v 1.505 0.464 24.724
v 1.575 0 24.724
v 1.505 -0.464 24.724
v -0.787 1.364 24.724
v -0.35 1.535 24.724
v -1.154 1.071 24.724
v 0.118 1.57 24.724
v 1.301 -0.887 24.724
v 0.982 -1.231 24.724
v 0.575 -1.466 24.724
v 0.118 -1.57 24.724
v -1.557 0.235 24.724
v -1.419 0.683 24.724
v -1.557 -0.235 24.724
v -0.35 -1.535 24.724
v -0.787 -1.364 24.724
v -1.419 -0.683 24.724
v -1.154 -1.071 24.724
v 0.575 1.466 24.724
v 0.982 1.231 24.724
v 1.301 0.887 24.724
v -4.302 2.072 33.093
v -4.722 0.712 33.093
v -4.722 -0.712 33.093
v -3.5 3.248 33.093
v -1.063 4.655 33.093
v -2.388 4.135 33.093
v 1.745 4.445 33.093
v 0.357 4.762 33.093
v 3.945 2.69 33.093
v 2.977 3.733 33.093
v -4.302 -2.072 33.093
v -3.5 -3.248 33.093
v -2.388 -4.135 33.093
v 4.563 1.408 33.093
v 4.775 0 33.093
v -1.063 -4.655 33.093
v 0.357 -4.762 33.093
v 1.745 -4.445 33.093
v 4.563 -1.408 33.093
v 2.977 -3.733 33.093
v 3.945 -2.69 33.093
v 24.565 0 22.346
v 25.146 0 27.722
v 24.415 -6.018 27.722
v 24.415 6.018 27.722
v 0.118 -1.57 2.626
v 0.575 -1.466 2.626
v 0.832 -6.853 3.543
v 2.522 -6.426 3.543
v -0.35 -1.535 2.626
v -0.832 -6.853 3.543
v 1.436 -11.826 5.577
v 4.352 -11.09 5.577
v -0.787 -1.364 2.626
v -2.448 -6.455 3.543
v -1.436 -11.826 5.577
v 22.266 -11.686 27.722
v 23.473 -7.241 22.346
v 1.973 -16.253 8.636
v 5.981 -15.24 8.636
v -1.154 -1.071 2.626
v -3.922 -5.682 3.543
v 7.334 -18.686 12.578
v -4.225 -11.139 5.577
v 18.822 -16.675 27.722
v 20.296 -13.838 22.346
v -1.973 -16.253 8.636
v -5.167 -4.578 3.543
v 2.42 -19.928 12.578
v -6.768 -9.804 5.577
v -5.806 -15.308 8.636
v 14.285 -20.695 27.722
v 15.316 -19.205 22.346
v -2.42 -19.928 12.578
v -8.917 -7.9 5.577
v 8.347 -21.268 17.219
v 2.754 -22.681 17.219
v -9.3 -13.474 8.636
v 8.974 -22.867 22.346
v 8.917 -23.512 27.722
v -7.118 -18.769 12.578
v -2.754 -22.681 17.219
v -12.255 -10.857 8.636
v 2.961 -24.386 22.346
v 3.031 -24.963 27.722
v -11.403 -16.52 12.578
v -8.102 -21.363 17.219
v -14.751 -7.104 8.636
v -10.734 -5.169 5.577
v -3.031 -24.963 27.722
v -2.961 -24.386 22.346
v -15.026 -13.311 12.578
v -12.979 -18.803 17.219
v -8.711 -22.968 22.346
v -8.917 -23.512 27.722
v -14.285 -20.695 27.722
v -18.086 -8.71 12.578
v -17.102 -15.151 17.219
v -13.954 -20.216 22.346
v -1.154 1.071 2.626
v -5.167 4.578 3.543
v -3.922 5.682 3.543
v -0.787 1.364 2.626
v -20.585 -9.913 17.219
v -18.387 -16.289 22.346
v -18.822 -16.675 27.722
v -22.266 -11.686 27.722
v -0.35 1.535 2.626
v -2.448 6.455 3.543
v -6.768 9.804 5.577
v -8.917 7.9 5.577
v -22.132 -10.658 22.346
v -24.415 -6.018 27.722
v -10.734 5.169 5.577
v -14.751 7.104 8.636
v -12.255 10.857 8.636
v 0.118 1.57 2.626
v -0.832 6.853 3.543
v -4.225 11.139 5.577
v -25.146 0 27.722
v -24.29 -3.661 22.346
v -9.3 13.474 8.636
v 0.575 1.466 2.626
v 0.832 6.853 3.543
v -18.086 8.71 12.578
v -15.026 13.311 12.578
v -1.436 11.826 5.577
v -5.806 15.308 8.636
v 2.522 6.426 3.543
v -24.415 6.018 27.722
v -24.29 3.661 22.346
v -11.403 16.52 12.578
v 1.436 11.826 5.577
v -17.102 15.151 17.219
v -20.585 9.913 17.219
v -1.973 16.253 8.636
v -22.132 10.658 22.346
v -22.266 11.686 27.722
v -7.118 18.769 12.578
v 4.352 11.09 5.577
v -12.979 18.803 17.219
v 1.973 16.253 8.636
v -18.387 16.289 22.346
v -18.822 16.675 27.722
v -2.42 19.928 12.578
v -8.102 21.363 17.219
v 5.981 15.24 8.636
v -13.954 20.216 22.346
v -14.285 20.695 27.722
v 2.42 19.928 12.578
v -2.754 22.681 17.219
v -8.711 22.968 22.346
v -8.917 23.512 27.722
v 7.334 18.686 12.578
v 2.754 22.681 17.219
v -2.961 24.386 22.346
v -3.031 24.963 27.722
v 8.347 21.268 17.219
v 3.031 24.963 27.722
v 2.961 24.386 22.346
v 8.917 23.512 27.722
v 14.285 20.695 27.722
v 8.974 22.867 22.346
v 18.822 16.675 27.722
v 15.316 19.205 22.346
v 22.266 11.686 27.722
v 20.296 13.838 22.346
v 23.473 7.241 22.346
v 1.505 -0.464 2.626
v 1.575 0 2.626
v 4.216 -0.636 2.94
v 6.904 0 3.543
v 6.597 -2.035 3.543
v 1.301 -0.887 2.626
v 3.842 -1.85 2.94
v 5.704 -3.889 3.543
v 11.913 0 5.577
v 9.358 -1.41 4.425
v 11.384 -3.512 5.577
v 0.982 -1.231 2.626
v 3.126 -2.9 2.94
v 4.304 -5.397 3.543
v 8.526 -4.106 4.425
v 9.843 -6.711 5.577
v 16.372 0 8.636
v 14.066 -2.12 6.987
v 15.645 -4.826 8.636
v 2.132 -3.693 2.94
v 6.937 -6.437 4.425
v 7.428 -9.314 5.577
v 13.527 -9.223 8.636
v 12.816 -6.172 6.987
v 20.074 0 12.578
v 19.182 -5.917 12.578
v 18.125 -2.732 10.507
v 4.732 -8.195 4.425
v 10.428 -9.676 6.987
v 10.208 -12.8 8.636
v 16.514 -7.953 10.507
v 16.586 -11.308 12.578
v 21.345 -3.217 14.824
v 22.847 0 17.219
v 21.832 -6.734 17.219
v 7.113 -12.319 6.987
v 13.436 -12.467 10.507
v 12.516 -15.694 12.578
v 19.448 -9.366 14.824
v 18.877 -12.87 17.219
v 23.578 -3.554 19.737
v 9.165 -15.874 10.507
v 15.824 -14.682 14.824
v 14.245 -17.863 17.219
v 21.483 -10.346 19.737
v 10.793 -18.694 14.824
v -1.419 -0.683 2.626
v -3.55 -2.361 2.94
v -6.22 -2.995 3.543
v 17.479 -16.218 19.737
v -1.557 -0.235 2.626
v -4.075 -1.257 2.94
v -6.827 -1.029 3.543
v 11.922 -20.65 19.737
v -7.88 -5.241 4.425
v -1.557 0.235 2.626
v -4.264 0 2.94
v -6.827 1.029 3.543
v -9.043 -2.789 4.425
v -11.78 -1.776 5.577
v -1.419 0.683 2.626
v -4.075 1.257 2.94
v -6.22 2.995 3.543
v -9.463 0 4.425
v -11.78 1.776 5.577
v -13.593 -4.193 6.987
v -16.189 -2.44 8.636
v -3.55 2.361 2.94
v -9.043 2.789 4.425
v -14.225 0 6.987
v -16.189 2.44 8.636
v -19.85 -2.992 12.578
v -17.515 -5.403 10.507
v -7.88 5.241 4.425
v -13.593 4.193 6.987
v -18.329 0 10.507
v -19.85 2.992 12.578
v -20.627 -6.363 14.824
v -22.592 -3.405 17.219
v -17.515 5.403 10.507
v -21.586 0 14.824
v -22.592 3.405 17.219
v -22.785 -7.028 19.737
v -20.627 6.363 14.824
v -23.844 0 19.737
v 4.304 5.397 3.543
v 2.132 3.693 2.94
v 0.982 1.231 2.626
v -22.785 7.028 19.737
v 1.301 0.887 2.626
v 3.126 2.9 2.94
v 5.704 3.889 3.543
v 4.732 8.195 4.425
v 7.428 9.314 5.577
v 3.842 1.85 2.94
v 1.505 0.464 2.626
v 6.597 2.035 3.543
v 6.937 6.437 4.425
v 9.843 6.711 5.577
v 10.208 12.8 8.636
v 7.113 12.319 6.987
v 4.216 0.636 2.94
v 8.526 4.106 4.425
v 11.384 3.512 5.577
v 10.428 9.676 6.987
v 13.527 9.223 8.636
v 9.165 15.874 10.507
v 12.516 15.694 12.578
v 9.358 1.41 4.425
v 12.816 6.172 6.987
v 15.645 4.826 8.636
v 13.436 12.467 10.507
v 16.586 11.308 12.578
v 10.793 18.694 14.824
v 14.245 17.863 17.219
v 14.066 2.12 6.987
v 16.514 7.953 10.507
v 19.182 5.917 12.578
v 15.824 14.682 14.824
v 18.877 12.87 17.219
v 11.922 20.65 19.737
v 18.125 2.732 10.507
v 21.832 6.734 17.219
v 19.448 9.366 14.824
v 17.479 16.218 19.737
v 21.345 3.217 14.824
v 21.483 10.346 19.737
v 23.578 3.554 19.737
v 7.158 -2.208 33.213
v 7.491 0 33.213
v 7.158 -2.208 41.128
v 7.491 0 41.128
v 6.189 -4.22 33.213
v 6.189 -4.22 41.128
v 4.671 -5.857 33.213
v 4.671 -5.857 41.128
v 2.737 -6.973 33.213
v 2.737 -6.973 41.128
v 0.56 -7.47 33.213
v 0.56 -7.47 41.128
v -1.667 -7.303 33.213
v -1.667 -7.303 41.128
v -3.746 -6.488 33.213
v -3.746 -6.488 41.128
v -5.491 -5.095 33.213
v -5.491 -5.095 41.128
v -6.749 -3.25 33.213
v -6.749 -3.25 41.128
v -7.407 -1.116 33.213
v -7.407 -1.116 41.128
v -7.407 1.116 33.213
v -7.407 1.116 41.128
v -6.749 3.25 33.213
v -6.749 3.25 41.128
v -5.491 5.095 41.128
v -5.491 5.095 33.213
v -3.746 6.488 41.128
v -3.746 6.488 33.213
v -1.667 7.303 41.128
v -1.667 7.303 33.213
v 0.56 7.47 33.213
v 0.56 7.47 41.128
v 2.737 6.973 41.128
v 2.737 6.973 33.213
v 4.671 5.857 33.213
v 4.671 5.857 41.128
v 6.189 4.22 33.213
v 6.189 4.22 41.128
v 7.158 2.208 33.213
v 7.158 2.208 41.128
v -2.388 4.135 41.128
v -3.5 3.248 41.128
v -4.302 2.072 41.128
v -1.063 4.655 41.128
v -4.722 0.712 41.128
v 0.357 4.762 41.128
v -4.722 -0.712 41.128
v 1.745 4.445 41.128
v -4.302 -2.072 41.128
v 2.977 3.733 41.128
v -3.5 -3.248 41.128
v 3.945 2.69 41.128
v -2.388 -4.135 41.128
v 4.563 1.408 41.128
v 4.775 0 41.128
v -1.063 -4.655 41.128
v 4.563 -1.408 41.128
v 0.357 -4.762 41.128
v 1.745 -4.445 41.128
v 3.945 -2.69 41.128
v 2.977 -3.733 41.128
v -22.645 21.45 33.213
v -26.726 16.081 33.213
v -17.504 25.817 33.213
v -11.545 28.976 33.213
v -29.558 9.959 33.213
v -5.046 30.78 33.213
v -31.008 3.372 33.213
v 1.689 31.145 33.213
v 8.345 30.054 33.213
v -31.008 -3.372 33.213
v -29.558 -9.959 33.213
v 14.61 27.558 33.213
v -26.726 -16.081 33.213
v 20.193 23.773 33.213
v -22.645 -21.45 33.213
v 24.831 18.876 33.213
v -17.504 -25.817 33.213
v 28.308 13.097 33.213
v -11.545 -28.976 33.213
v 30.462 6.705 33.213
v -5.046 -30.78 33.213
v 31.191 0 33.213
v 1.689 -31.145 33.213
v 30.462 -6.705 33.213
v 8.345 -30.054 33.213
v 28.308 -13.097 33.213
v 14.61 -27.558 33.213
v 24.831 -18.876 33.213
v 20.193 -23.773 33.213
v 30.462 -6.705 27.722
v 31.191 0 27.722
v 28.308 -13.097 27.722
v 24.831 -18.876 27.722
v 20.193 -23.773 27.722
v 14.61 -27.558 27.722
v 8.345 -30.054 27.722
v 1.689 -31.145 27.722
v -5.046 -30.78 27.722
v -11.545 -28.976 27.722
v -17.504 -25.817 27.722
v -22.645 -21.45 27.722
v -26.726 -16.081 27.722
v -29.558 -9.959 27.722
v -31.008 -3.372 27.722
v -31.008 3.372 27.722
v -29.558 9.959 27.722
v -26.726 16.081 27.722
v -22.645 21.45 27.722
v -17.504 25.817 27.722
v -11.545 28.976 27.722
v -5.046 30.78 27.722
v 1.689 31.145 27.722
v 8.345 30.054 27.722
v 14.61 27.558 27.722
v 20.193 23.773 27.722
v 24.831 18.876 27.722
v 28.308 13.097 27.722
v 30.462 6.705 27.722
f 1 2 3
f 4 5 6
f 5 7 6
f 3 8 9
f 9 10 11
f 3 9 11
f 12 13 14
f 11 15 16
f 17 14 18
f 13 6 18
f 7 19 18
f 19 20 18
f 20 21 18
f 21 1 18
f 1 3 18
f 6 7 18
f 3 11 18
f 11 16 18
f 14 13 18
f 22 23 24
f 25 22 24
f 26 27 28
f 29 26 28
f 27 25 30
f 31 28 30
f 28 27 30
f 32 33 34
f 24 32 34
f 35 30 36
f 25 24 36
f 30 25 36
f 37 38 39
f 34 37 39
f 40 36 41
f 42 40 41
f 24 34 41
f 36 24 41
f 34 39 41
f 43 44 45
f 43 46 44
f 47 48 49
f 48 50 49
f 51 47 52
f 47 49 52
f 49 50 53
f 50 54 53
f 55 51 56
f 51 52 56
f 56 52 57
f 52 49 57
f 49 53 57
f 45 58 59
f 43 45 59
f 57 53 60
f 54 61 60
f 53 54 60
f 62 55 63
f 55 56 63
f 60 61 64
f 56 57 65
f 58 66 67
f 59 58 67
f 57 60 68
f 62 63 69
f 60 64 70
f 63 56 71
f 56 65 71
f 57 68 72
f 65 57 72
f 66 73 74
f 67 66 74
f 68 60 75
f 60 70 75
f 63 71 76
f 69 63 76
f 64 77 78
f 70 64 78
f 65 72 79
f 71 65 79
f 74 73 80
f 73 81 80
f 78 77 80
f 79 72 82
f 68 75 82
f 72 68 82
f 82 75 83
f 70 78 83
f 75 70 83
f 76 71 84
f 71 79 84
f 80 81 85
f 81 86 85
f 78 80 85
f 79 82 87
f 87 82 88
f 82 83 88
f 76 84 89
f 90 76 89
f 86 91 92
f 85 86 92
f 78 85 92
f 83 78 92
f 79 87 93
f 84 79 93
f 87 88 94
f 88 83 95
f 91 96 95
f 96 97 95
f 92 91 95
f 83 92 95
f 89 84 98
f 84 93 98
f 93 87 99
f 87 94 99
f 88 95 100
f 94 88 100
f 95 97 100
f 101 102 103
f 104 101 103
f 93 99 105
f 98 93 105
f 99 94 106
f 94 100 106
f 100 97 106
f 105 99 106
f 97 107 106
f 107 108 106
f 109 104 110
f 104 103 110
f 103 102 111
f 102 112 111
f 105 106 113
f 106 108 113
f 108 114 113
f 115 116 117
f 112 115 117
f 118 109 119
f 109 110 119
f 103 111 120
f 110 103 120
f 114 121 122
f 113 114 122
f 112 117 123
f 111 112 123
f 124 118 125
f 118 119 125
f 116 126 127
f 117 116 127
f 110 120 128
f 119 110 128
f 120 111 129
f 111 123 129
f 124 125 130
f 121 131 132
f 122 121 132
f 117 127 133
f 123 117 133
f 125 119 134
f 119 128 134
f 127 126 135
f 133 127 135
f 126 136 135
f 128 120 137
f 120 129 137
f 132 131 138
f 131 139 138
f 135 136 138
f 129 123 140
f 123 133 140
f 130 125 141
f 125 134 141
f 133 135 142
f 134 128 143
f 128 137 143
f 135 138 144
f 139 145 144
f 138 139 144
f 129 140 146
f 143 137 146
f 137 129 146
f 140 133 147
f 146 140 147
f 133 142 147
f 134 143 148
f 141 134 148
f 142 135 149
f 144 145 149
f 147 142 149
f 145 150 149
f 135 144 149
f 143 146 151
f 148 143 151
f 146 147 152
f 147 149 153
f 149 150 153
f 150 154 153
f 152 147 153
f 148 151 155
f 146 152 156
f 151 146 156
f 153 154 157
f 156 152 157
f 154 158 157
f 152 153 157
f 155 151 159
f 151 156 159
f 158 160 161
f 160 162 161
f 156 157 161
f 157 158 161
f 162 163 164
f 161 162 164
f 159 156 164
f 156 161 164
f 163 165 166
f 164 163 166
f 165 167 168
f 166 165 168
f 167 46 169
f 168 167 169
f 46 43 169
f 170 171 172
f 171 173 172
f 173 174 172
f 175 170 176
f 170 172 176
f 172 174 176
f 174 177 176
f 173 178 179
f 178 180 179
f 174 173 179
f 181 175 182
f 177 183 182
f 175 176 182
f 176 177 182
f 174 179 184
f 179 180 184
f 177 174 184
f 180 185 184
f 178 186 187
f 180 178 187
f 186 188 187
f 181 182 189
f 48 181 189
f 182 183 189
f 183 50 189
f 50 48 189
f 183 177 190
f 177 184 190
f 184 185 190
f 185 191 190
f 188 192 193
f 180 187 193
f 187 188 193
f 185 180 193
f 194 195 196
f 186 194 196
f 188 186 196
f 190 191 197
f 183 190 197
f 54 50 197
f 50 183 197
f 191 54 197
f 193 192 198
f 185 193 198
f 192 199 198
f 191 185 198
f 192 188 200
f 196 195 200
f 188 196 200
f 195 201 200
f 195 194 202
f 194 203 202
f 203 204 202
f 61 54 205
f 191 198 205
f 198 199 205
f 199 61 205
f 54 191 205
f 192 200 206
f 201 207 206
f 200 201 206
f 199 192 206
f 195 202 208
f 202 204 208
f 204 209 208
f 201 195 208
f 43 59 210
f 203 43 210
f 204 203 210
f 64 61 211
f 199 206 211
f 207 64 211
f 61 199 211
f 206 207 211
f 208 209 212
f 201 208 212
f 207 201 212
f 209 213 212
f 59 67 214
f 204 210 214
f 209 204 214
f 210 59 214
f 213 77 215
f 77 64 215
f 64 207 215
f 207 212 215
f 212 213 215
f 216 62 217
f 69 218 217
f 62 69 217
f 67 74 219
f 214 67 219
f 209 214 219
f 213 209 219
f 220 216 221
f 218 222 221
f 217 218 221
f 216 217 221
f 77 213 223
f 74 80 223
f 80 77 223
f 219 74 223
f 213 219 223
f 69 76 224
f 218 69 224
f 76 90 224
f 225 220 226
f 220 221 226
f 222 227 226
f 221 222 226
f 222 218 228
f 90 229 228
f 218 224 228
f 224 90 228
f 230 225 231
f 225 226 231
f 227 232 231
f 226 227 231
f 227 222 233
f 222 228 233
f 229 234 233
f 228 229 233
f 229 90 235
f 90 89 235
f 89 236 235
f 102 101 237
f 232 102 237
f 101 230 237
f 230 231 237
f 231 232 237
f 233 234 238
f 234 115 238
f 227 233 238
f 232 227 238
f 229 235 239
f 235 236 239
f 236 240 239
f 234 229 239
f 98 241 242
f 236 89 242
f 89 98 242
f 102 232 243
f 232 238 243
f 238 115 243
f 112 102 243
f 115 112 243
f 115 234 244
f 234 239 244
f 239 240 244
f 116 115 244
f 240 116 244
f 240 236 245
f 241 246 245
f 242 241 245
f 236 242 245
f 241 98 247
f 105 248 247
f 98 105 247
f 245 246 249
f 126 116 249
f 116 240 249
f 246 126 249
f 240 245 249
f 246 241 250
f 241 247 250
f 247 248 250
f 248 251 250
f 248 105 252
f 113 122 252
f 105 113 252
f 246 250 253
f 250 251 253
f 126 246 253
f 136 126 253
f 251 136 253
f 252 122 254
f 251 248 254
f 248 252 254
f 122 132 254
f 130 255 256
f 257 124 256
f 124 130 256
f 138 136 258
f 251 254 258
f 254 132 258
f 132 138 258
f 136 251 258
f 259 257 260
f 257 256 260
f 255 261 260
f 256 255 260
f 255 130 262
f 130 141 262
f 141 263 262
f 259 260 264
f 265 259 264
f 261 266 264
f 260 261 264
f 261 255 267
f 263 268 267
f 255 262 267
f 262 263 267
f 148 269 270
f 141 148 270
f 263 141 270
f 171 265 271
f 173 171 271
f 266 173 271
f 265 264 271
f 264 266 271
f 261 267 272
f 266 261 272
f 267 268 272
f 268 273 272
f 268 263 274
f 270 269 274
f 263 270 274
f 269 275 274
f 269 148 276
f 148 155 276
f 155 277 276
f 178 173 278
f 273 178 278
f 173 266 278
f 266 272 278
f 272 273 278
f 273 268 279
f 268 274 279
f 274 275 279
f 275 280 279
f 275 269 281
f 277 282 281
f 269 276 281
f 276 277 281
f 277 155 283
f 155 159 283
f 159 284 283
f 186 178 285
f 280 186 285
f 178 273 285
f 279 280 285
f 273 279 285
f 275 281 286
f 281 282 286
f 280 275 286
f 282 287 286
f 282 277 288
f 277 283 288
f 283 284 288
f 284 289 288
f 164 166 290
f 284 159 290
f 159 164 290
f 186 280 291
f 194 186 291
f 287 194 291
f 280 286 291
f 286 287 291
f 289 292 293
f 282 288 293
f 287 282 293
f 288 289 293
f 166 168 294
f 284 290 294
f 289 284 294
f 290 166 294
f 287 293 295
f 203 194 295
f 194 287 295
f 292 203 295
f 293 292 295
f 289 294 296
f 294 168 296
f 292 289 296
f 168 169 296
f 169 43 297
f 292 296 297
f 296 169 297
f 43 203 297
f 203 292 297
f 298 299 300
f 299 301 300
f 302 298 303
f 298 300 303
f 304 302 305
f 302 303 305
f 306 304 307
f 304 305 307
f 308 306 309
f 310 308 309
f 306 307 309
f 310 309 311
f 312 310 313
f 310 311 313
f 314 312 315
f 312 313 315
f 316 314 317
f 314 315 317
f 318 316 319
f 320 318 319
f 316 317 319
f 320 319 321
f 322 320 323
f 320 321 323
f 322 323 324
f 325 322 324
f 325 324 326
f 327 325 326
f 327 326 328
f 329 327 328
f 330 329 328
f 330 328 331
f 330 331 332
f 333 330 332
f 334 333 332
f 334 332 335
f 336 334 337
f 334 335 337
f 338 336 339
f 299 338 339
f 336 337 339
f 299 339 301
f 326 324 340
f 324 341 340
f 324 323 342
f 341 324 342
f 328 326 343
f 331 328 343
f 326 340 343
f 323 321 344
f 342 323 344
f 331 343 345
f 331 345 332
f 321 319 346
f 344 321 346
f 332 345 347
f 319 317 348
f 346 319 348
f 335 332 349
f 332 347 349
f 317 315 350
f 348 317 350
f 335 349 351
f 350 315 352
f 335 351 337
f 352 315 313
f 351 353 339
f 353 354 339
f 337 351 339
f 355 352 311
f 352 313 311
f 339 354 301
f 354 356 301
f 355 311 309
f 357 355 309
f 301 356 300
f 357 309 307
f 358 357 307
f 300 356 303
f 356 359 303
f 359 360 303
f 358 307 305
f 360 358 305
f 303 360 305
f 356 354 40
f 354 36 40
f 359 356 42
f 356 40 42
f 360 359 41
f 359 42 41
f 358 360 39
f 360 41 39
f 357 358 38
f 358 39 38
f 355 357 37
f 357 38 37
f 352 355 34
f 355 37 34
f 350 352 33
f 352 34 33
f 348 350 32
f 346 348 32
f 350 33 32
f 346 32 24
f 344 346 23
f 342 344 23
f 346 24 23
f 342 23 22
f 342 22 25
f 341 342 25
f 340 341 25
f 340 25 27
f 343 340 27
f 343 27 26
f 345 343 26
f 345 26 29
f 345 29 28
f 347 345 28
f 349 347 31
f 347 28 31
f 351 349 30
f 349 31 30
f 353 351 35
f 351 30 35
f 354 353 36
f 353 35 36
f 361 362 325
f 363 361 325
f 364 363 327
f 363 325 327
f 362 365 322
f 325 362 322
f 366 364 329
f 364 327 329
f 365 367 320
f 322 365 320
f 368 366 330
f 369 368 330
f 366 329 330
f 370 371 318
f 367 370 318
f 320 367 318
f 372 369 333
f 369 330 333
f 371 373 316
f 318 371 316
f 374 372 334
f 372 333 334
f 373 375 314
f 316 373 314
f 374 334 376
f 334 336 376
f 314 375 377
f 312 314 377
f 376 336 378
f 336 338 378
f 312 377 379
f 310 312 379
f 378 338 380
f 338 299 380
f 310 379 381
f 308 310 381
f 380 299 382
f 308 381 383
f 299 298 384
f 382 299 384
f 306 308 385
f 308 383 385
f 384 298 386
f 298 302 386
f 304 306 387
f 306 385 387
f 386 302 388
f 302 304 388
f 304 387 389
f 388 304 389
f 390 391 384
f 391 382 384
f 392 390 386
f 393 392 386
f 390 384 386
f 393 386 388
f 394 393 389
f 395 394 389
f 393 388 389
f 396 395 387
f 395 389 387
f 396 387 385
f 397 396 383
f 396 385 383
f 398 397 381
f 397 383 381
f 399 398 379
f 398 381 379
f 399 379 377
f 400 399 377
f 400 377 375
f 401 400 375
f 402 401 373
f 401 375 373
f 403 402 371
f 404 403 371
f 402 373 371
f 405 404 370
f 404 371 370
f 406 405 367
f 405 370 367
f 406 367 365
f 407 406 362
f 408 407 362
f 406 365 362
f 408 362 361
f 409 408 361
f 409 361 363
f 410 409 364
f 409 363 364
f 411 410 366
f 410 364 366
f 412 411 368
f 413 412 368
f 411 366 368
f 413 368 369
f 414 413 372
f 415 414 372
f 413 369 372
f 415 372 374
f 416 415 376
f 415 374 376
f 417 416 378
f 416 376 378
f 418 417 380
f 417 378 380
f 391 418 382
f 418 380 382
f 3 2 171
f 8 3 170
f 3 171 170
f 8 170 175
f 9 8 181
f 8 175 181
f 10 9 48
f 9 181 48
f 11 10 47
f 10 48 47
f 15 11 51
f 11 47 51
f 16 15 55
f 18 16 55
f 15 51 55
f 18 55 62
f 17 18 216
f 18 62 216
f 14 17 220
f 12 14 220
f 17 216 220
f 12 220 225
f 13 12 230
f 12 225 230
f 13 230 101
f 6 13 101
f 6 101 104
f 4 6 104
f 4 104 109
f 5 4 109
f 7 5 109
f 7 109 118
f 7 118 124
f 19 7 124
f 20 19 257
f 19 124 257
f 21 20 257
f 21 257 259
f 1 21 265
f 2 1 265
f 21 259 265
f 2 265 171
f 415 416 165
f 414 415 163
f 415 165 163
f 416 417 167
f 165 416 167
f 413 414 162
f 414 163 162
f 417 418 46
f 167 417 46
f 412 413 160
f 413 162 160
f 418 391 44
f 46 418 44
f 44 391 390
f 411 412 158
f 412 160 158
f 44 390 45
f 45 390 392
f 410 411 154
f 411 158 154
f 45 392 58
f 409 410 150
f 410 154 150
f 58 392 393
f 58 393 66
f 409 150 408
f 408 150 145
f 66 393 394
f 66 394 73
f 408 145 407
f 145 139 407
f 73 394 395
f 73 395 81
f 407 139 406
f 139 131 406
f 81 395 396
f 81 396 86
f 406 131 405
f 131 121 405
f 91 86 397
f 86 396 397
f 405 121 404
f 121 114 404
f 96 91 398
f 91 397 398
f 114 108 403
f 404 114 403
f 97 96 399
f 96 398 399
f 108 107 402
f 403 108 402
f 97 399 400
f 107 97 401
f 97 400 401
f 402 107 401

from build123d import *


with BuildPart() as f1:
    # F0 (on Front) → F1 (revolve)
    with BuildSketch(Plane.XZ):
        with BuildLine():
            Line((1.5748, 24.723661), (1.5748, 2.625661))
            ThreePointArc((1.5748, 2.625661), (18.329229, 10.50717), (25.146, 27.7223))
            Line((25.146, 27.7223), (31.1912, 27.7223))
            Line((31.1912, 27.7223), (31.1912, 33.212919))
            Line((31.1912, 33.212919), (7.491138, 33.212919))
            Line((7.491138, 33.212919), (7.491138, 41.128229))
            Line((7.491138, 41.128229), (4.7752, 41.128229))
            Line((4.7752, 41.128229), (4.7752, 33.092991))
            Line((4.7752, 33.092991), (0, 33.092991))
            Line((0, 33.092991), (0, 24.723661))
            Line((0, 24.723661), (1.5748, 24.723661))
        make_face()
    revolve(axis=Axis((0, 0, 28.908326), (0, 0, -1)))


solid = f1.part
